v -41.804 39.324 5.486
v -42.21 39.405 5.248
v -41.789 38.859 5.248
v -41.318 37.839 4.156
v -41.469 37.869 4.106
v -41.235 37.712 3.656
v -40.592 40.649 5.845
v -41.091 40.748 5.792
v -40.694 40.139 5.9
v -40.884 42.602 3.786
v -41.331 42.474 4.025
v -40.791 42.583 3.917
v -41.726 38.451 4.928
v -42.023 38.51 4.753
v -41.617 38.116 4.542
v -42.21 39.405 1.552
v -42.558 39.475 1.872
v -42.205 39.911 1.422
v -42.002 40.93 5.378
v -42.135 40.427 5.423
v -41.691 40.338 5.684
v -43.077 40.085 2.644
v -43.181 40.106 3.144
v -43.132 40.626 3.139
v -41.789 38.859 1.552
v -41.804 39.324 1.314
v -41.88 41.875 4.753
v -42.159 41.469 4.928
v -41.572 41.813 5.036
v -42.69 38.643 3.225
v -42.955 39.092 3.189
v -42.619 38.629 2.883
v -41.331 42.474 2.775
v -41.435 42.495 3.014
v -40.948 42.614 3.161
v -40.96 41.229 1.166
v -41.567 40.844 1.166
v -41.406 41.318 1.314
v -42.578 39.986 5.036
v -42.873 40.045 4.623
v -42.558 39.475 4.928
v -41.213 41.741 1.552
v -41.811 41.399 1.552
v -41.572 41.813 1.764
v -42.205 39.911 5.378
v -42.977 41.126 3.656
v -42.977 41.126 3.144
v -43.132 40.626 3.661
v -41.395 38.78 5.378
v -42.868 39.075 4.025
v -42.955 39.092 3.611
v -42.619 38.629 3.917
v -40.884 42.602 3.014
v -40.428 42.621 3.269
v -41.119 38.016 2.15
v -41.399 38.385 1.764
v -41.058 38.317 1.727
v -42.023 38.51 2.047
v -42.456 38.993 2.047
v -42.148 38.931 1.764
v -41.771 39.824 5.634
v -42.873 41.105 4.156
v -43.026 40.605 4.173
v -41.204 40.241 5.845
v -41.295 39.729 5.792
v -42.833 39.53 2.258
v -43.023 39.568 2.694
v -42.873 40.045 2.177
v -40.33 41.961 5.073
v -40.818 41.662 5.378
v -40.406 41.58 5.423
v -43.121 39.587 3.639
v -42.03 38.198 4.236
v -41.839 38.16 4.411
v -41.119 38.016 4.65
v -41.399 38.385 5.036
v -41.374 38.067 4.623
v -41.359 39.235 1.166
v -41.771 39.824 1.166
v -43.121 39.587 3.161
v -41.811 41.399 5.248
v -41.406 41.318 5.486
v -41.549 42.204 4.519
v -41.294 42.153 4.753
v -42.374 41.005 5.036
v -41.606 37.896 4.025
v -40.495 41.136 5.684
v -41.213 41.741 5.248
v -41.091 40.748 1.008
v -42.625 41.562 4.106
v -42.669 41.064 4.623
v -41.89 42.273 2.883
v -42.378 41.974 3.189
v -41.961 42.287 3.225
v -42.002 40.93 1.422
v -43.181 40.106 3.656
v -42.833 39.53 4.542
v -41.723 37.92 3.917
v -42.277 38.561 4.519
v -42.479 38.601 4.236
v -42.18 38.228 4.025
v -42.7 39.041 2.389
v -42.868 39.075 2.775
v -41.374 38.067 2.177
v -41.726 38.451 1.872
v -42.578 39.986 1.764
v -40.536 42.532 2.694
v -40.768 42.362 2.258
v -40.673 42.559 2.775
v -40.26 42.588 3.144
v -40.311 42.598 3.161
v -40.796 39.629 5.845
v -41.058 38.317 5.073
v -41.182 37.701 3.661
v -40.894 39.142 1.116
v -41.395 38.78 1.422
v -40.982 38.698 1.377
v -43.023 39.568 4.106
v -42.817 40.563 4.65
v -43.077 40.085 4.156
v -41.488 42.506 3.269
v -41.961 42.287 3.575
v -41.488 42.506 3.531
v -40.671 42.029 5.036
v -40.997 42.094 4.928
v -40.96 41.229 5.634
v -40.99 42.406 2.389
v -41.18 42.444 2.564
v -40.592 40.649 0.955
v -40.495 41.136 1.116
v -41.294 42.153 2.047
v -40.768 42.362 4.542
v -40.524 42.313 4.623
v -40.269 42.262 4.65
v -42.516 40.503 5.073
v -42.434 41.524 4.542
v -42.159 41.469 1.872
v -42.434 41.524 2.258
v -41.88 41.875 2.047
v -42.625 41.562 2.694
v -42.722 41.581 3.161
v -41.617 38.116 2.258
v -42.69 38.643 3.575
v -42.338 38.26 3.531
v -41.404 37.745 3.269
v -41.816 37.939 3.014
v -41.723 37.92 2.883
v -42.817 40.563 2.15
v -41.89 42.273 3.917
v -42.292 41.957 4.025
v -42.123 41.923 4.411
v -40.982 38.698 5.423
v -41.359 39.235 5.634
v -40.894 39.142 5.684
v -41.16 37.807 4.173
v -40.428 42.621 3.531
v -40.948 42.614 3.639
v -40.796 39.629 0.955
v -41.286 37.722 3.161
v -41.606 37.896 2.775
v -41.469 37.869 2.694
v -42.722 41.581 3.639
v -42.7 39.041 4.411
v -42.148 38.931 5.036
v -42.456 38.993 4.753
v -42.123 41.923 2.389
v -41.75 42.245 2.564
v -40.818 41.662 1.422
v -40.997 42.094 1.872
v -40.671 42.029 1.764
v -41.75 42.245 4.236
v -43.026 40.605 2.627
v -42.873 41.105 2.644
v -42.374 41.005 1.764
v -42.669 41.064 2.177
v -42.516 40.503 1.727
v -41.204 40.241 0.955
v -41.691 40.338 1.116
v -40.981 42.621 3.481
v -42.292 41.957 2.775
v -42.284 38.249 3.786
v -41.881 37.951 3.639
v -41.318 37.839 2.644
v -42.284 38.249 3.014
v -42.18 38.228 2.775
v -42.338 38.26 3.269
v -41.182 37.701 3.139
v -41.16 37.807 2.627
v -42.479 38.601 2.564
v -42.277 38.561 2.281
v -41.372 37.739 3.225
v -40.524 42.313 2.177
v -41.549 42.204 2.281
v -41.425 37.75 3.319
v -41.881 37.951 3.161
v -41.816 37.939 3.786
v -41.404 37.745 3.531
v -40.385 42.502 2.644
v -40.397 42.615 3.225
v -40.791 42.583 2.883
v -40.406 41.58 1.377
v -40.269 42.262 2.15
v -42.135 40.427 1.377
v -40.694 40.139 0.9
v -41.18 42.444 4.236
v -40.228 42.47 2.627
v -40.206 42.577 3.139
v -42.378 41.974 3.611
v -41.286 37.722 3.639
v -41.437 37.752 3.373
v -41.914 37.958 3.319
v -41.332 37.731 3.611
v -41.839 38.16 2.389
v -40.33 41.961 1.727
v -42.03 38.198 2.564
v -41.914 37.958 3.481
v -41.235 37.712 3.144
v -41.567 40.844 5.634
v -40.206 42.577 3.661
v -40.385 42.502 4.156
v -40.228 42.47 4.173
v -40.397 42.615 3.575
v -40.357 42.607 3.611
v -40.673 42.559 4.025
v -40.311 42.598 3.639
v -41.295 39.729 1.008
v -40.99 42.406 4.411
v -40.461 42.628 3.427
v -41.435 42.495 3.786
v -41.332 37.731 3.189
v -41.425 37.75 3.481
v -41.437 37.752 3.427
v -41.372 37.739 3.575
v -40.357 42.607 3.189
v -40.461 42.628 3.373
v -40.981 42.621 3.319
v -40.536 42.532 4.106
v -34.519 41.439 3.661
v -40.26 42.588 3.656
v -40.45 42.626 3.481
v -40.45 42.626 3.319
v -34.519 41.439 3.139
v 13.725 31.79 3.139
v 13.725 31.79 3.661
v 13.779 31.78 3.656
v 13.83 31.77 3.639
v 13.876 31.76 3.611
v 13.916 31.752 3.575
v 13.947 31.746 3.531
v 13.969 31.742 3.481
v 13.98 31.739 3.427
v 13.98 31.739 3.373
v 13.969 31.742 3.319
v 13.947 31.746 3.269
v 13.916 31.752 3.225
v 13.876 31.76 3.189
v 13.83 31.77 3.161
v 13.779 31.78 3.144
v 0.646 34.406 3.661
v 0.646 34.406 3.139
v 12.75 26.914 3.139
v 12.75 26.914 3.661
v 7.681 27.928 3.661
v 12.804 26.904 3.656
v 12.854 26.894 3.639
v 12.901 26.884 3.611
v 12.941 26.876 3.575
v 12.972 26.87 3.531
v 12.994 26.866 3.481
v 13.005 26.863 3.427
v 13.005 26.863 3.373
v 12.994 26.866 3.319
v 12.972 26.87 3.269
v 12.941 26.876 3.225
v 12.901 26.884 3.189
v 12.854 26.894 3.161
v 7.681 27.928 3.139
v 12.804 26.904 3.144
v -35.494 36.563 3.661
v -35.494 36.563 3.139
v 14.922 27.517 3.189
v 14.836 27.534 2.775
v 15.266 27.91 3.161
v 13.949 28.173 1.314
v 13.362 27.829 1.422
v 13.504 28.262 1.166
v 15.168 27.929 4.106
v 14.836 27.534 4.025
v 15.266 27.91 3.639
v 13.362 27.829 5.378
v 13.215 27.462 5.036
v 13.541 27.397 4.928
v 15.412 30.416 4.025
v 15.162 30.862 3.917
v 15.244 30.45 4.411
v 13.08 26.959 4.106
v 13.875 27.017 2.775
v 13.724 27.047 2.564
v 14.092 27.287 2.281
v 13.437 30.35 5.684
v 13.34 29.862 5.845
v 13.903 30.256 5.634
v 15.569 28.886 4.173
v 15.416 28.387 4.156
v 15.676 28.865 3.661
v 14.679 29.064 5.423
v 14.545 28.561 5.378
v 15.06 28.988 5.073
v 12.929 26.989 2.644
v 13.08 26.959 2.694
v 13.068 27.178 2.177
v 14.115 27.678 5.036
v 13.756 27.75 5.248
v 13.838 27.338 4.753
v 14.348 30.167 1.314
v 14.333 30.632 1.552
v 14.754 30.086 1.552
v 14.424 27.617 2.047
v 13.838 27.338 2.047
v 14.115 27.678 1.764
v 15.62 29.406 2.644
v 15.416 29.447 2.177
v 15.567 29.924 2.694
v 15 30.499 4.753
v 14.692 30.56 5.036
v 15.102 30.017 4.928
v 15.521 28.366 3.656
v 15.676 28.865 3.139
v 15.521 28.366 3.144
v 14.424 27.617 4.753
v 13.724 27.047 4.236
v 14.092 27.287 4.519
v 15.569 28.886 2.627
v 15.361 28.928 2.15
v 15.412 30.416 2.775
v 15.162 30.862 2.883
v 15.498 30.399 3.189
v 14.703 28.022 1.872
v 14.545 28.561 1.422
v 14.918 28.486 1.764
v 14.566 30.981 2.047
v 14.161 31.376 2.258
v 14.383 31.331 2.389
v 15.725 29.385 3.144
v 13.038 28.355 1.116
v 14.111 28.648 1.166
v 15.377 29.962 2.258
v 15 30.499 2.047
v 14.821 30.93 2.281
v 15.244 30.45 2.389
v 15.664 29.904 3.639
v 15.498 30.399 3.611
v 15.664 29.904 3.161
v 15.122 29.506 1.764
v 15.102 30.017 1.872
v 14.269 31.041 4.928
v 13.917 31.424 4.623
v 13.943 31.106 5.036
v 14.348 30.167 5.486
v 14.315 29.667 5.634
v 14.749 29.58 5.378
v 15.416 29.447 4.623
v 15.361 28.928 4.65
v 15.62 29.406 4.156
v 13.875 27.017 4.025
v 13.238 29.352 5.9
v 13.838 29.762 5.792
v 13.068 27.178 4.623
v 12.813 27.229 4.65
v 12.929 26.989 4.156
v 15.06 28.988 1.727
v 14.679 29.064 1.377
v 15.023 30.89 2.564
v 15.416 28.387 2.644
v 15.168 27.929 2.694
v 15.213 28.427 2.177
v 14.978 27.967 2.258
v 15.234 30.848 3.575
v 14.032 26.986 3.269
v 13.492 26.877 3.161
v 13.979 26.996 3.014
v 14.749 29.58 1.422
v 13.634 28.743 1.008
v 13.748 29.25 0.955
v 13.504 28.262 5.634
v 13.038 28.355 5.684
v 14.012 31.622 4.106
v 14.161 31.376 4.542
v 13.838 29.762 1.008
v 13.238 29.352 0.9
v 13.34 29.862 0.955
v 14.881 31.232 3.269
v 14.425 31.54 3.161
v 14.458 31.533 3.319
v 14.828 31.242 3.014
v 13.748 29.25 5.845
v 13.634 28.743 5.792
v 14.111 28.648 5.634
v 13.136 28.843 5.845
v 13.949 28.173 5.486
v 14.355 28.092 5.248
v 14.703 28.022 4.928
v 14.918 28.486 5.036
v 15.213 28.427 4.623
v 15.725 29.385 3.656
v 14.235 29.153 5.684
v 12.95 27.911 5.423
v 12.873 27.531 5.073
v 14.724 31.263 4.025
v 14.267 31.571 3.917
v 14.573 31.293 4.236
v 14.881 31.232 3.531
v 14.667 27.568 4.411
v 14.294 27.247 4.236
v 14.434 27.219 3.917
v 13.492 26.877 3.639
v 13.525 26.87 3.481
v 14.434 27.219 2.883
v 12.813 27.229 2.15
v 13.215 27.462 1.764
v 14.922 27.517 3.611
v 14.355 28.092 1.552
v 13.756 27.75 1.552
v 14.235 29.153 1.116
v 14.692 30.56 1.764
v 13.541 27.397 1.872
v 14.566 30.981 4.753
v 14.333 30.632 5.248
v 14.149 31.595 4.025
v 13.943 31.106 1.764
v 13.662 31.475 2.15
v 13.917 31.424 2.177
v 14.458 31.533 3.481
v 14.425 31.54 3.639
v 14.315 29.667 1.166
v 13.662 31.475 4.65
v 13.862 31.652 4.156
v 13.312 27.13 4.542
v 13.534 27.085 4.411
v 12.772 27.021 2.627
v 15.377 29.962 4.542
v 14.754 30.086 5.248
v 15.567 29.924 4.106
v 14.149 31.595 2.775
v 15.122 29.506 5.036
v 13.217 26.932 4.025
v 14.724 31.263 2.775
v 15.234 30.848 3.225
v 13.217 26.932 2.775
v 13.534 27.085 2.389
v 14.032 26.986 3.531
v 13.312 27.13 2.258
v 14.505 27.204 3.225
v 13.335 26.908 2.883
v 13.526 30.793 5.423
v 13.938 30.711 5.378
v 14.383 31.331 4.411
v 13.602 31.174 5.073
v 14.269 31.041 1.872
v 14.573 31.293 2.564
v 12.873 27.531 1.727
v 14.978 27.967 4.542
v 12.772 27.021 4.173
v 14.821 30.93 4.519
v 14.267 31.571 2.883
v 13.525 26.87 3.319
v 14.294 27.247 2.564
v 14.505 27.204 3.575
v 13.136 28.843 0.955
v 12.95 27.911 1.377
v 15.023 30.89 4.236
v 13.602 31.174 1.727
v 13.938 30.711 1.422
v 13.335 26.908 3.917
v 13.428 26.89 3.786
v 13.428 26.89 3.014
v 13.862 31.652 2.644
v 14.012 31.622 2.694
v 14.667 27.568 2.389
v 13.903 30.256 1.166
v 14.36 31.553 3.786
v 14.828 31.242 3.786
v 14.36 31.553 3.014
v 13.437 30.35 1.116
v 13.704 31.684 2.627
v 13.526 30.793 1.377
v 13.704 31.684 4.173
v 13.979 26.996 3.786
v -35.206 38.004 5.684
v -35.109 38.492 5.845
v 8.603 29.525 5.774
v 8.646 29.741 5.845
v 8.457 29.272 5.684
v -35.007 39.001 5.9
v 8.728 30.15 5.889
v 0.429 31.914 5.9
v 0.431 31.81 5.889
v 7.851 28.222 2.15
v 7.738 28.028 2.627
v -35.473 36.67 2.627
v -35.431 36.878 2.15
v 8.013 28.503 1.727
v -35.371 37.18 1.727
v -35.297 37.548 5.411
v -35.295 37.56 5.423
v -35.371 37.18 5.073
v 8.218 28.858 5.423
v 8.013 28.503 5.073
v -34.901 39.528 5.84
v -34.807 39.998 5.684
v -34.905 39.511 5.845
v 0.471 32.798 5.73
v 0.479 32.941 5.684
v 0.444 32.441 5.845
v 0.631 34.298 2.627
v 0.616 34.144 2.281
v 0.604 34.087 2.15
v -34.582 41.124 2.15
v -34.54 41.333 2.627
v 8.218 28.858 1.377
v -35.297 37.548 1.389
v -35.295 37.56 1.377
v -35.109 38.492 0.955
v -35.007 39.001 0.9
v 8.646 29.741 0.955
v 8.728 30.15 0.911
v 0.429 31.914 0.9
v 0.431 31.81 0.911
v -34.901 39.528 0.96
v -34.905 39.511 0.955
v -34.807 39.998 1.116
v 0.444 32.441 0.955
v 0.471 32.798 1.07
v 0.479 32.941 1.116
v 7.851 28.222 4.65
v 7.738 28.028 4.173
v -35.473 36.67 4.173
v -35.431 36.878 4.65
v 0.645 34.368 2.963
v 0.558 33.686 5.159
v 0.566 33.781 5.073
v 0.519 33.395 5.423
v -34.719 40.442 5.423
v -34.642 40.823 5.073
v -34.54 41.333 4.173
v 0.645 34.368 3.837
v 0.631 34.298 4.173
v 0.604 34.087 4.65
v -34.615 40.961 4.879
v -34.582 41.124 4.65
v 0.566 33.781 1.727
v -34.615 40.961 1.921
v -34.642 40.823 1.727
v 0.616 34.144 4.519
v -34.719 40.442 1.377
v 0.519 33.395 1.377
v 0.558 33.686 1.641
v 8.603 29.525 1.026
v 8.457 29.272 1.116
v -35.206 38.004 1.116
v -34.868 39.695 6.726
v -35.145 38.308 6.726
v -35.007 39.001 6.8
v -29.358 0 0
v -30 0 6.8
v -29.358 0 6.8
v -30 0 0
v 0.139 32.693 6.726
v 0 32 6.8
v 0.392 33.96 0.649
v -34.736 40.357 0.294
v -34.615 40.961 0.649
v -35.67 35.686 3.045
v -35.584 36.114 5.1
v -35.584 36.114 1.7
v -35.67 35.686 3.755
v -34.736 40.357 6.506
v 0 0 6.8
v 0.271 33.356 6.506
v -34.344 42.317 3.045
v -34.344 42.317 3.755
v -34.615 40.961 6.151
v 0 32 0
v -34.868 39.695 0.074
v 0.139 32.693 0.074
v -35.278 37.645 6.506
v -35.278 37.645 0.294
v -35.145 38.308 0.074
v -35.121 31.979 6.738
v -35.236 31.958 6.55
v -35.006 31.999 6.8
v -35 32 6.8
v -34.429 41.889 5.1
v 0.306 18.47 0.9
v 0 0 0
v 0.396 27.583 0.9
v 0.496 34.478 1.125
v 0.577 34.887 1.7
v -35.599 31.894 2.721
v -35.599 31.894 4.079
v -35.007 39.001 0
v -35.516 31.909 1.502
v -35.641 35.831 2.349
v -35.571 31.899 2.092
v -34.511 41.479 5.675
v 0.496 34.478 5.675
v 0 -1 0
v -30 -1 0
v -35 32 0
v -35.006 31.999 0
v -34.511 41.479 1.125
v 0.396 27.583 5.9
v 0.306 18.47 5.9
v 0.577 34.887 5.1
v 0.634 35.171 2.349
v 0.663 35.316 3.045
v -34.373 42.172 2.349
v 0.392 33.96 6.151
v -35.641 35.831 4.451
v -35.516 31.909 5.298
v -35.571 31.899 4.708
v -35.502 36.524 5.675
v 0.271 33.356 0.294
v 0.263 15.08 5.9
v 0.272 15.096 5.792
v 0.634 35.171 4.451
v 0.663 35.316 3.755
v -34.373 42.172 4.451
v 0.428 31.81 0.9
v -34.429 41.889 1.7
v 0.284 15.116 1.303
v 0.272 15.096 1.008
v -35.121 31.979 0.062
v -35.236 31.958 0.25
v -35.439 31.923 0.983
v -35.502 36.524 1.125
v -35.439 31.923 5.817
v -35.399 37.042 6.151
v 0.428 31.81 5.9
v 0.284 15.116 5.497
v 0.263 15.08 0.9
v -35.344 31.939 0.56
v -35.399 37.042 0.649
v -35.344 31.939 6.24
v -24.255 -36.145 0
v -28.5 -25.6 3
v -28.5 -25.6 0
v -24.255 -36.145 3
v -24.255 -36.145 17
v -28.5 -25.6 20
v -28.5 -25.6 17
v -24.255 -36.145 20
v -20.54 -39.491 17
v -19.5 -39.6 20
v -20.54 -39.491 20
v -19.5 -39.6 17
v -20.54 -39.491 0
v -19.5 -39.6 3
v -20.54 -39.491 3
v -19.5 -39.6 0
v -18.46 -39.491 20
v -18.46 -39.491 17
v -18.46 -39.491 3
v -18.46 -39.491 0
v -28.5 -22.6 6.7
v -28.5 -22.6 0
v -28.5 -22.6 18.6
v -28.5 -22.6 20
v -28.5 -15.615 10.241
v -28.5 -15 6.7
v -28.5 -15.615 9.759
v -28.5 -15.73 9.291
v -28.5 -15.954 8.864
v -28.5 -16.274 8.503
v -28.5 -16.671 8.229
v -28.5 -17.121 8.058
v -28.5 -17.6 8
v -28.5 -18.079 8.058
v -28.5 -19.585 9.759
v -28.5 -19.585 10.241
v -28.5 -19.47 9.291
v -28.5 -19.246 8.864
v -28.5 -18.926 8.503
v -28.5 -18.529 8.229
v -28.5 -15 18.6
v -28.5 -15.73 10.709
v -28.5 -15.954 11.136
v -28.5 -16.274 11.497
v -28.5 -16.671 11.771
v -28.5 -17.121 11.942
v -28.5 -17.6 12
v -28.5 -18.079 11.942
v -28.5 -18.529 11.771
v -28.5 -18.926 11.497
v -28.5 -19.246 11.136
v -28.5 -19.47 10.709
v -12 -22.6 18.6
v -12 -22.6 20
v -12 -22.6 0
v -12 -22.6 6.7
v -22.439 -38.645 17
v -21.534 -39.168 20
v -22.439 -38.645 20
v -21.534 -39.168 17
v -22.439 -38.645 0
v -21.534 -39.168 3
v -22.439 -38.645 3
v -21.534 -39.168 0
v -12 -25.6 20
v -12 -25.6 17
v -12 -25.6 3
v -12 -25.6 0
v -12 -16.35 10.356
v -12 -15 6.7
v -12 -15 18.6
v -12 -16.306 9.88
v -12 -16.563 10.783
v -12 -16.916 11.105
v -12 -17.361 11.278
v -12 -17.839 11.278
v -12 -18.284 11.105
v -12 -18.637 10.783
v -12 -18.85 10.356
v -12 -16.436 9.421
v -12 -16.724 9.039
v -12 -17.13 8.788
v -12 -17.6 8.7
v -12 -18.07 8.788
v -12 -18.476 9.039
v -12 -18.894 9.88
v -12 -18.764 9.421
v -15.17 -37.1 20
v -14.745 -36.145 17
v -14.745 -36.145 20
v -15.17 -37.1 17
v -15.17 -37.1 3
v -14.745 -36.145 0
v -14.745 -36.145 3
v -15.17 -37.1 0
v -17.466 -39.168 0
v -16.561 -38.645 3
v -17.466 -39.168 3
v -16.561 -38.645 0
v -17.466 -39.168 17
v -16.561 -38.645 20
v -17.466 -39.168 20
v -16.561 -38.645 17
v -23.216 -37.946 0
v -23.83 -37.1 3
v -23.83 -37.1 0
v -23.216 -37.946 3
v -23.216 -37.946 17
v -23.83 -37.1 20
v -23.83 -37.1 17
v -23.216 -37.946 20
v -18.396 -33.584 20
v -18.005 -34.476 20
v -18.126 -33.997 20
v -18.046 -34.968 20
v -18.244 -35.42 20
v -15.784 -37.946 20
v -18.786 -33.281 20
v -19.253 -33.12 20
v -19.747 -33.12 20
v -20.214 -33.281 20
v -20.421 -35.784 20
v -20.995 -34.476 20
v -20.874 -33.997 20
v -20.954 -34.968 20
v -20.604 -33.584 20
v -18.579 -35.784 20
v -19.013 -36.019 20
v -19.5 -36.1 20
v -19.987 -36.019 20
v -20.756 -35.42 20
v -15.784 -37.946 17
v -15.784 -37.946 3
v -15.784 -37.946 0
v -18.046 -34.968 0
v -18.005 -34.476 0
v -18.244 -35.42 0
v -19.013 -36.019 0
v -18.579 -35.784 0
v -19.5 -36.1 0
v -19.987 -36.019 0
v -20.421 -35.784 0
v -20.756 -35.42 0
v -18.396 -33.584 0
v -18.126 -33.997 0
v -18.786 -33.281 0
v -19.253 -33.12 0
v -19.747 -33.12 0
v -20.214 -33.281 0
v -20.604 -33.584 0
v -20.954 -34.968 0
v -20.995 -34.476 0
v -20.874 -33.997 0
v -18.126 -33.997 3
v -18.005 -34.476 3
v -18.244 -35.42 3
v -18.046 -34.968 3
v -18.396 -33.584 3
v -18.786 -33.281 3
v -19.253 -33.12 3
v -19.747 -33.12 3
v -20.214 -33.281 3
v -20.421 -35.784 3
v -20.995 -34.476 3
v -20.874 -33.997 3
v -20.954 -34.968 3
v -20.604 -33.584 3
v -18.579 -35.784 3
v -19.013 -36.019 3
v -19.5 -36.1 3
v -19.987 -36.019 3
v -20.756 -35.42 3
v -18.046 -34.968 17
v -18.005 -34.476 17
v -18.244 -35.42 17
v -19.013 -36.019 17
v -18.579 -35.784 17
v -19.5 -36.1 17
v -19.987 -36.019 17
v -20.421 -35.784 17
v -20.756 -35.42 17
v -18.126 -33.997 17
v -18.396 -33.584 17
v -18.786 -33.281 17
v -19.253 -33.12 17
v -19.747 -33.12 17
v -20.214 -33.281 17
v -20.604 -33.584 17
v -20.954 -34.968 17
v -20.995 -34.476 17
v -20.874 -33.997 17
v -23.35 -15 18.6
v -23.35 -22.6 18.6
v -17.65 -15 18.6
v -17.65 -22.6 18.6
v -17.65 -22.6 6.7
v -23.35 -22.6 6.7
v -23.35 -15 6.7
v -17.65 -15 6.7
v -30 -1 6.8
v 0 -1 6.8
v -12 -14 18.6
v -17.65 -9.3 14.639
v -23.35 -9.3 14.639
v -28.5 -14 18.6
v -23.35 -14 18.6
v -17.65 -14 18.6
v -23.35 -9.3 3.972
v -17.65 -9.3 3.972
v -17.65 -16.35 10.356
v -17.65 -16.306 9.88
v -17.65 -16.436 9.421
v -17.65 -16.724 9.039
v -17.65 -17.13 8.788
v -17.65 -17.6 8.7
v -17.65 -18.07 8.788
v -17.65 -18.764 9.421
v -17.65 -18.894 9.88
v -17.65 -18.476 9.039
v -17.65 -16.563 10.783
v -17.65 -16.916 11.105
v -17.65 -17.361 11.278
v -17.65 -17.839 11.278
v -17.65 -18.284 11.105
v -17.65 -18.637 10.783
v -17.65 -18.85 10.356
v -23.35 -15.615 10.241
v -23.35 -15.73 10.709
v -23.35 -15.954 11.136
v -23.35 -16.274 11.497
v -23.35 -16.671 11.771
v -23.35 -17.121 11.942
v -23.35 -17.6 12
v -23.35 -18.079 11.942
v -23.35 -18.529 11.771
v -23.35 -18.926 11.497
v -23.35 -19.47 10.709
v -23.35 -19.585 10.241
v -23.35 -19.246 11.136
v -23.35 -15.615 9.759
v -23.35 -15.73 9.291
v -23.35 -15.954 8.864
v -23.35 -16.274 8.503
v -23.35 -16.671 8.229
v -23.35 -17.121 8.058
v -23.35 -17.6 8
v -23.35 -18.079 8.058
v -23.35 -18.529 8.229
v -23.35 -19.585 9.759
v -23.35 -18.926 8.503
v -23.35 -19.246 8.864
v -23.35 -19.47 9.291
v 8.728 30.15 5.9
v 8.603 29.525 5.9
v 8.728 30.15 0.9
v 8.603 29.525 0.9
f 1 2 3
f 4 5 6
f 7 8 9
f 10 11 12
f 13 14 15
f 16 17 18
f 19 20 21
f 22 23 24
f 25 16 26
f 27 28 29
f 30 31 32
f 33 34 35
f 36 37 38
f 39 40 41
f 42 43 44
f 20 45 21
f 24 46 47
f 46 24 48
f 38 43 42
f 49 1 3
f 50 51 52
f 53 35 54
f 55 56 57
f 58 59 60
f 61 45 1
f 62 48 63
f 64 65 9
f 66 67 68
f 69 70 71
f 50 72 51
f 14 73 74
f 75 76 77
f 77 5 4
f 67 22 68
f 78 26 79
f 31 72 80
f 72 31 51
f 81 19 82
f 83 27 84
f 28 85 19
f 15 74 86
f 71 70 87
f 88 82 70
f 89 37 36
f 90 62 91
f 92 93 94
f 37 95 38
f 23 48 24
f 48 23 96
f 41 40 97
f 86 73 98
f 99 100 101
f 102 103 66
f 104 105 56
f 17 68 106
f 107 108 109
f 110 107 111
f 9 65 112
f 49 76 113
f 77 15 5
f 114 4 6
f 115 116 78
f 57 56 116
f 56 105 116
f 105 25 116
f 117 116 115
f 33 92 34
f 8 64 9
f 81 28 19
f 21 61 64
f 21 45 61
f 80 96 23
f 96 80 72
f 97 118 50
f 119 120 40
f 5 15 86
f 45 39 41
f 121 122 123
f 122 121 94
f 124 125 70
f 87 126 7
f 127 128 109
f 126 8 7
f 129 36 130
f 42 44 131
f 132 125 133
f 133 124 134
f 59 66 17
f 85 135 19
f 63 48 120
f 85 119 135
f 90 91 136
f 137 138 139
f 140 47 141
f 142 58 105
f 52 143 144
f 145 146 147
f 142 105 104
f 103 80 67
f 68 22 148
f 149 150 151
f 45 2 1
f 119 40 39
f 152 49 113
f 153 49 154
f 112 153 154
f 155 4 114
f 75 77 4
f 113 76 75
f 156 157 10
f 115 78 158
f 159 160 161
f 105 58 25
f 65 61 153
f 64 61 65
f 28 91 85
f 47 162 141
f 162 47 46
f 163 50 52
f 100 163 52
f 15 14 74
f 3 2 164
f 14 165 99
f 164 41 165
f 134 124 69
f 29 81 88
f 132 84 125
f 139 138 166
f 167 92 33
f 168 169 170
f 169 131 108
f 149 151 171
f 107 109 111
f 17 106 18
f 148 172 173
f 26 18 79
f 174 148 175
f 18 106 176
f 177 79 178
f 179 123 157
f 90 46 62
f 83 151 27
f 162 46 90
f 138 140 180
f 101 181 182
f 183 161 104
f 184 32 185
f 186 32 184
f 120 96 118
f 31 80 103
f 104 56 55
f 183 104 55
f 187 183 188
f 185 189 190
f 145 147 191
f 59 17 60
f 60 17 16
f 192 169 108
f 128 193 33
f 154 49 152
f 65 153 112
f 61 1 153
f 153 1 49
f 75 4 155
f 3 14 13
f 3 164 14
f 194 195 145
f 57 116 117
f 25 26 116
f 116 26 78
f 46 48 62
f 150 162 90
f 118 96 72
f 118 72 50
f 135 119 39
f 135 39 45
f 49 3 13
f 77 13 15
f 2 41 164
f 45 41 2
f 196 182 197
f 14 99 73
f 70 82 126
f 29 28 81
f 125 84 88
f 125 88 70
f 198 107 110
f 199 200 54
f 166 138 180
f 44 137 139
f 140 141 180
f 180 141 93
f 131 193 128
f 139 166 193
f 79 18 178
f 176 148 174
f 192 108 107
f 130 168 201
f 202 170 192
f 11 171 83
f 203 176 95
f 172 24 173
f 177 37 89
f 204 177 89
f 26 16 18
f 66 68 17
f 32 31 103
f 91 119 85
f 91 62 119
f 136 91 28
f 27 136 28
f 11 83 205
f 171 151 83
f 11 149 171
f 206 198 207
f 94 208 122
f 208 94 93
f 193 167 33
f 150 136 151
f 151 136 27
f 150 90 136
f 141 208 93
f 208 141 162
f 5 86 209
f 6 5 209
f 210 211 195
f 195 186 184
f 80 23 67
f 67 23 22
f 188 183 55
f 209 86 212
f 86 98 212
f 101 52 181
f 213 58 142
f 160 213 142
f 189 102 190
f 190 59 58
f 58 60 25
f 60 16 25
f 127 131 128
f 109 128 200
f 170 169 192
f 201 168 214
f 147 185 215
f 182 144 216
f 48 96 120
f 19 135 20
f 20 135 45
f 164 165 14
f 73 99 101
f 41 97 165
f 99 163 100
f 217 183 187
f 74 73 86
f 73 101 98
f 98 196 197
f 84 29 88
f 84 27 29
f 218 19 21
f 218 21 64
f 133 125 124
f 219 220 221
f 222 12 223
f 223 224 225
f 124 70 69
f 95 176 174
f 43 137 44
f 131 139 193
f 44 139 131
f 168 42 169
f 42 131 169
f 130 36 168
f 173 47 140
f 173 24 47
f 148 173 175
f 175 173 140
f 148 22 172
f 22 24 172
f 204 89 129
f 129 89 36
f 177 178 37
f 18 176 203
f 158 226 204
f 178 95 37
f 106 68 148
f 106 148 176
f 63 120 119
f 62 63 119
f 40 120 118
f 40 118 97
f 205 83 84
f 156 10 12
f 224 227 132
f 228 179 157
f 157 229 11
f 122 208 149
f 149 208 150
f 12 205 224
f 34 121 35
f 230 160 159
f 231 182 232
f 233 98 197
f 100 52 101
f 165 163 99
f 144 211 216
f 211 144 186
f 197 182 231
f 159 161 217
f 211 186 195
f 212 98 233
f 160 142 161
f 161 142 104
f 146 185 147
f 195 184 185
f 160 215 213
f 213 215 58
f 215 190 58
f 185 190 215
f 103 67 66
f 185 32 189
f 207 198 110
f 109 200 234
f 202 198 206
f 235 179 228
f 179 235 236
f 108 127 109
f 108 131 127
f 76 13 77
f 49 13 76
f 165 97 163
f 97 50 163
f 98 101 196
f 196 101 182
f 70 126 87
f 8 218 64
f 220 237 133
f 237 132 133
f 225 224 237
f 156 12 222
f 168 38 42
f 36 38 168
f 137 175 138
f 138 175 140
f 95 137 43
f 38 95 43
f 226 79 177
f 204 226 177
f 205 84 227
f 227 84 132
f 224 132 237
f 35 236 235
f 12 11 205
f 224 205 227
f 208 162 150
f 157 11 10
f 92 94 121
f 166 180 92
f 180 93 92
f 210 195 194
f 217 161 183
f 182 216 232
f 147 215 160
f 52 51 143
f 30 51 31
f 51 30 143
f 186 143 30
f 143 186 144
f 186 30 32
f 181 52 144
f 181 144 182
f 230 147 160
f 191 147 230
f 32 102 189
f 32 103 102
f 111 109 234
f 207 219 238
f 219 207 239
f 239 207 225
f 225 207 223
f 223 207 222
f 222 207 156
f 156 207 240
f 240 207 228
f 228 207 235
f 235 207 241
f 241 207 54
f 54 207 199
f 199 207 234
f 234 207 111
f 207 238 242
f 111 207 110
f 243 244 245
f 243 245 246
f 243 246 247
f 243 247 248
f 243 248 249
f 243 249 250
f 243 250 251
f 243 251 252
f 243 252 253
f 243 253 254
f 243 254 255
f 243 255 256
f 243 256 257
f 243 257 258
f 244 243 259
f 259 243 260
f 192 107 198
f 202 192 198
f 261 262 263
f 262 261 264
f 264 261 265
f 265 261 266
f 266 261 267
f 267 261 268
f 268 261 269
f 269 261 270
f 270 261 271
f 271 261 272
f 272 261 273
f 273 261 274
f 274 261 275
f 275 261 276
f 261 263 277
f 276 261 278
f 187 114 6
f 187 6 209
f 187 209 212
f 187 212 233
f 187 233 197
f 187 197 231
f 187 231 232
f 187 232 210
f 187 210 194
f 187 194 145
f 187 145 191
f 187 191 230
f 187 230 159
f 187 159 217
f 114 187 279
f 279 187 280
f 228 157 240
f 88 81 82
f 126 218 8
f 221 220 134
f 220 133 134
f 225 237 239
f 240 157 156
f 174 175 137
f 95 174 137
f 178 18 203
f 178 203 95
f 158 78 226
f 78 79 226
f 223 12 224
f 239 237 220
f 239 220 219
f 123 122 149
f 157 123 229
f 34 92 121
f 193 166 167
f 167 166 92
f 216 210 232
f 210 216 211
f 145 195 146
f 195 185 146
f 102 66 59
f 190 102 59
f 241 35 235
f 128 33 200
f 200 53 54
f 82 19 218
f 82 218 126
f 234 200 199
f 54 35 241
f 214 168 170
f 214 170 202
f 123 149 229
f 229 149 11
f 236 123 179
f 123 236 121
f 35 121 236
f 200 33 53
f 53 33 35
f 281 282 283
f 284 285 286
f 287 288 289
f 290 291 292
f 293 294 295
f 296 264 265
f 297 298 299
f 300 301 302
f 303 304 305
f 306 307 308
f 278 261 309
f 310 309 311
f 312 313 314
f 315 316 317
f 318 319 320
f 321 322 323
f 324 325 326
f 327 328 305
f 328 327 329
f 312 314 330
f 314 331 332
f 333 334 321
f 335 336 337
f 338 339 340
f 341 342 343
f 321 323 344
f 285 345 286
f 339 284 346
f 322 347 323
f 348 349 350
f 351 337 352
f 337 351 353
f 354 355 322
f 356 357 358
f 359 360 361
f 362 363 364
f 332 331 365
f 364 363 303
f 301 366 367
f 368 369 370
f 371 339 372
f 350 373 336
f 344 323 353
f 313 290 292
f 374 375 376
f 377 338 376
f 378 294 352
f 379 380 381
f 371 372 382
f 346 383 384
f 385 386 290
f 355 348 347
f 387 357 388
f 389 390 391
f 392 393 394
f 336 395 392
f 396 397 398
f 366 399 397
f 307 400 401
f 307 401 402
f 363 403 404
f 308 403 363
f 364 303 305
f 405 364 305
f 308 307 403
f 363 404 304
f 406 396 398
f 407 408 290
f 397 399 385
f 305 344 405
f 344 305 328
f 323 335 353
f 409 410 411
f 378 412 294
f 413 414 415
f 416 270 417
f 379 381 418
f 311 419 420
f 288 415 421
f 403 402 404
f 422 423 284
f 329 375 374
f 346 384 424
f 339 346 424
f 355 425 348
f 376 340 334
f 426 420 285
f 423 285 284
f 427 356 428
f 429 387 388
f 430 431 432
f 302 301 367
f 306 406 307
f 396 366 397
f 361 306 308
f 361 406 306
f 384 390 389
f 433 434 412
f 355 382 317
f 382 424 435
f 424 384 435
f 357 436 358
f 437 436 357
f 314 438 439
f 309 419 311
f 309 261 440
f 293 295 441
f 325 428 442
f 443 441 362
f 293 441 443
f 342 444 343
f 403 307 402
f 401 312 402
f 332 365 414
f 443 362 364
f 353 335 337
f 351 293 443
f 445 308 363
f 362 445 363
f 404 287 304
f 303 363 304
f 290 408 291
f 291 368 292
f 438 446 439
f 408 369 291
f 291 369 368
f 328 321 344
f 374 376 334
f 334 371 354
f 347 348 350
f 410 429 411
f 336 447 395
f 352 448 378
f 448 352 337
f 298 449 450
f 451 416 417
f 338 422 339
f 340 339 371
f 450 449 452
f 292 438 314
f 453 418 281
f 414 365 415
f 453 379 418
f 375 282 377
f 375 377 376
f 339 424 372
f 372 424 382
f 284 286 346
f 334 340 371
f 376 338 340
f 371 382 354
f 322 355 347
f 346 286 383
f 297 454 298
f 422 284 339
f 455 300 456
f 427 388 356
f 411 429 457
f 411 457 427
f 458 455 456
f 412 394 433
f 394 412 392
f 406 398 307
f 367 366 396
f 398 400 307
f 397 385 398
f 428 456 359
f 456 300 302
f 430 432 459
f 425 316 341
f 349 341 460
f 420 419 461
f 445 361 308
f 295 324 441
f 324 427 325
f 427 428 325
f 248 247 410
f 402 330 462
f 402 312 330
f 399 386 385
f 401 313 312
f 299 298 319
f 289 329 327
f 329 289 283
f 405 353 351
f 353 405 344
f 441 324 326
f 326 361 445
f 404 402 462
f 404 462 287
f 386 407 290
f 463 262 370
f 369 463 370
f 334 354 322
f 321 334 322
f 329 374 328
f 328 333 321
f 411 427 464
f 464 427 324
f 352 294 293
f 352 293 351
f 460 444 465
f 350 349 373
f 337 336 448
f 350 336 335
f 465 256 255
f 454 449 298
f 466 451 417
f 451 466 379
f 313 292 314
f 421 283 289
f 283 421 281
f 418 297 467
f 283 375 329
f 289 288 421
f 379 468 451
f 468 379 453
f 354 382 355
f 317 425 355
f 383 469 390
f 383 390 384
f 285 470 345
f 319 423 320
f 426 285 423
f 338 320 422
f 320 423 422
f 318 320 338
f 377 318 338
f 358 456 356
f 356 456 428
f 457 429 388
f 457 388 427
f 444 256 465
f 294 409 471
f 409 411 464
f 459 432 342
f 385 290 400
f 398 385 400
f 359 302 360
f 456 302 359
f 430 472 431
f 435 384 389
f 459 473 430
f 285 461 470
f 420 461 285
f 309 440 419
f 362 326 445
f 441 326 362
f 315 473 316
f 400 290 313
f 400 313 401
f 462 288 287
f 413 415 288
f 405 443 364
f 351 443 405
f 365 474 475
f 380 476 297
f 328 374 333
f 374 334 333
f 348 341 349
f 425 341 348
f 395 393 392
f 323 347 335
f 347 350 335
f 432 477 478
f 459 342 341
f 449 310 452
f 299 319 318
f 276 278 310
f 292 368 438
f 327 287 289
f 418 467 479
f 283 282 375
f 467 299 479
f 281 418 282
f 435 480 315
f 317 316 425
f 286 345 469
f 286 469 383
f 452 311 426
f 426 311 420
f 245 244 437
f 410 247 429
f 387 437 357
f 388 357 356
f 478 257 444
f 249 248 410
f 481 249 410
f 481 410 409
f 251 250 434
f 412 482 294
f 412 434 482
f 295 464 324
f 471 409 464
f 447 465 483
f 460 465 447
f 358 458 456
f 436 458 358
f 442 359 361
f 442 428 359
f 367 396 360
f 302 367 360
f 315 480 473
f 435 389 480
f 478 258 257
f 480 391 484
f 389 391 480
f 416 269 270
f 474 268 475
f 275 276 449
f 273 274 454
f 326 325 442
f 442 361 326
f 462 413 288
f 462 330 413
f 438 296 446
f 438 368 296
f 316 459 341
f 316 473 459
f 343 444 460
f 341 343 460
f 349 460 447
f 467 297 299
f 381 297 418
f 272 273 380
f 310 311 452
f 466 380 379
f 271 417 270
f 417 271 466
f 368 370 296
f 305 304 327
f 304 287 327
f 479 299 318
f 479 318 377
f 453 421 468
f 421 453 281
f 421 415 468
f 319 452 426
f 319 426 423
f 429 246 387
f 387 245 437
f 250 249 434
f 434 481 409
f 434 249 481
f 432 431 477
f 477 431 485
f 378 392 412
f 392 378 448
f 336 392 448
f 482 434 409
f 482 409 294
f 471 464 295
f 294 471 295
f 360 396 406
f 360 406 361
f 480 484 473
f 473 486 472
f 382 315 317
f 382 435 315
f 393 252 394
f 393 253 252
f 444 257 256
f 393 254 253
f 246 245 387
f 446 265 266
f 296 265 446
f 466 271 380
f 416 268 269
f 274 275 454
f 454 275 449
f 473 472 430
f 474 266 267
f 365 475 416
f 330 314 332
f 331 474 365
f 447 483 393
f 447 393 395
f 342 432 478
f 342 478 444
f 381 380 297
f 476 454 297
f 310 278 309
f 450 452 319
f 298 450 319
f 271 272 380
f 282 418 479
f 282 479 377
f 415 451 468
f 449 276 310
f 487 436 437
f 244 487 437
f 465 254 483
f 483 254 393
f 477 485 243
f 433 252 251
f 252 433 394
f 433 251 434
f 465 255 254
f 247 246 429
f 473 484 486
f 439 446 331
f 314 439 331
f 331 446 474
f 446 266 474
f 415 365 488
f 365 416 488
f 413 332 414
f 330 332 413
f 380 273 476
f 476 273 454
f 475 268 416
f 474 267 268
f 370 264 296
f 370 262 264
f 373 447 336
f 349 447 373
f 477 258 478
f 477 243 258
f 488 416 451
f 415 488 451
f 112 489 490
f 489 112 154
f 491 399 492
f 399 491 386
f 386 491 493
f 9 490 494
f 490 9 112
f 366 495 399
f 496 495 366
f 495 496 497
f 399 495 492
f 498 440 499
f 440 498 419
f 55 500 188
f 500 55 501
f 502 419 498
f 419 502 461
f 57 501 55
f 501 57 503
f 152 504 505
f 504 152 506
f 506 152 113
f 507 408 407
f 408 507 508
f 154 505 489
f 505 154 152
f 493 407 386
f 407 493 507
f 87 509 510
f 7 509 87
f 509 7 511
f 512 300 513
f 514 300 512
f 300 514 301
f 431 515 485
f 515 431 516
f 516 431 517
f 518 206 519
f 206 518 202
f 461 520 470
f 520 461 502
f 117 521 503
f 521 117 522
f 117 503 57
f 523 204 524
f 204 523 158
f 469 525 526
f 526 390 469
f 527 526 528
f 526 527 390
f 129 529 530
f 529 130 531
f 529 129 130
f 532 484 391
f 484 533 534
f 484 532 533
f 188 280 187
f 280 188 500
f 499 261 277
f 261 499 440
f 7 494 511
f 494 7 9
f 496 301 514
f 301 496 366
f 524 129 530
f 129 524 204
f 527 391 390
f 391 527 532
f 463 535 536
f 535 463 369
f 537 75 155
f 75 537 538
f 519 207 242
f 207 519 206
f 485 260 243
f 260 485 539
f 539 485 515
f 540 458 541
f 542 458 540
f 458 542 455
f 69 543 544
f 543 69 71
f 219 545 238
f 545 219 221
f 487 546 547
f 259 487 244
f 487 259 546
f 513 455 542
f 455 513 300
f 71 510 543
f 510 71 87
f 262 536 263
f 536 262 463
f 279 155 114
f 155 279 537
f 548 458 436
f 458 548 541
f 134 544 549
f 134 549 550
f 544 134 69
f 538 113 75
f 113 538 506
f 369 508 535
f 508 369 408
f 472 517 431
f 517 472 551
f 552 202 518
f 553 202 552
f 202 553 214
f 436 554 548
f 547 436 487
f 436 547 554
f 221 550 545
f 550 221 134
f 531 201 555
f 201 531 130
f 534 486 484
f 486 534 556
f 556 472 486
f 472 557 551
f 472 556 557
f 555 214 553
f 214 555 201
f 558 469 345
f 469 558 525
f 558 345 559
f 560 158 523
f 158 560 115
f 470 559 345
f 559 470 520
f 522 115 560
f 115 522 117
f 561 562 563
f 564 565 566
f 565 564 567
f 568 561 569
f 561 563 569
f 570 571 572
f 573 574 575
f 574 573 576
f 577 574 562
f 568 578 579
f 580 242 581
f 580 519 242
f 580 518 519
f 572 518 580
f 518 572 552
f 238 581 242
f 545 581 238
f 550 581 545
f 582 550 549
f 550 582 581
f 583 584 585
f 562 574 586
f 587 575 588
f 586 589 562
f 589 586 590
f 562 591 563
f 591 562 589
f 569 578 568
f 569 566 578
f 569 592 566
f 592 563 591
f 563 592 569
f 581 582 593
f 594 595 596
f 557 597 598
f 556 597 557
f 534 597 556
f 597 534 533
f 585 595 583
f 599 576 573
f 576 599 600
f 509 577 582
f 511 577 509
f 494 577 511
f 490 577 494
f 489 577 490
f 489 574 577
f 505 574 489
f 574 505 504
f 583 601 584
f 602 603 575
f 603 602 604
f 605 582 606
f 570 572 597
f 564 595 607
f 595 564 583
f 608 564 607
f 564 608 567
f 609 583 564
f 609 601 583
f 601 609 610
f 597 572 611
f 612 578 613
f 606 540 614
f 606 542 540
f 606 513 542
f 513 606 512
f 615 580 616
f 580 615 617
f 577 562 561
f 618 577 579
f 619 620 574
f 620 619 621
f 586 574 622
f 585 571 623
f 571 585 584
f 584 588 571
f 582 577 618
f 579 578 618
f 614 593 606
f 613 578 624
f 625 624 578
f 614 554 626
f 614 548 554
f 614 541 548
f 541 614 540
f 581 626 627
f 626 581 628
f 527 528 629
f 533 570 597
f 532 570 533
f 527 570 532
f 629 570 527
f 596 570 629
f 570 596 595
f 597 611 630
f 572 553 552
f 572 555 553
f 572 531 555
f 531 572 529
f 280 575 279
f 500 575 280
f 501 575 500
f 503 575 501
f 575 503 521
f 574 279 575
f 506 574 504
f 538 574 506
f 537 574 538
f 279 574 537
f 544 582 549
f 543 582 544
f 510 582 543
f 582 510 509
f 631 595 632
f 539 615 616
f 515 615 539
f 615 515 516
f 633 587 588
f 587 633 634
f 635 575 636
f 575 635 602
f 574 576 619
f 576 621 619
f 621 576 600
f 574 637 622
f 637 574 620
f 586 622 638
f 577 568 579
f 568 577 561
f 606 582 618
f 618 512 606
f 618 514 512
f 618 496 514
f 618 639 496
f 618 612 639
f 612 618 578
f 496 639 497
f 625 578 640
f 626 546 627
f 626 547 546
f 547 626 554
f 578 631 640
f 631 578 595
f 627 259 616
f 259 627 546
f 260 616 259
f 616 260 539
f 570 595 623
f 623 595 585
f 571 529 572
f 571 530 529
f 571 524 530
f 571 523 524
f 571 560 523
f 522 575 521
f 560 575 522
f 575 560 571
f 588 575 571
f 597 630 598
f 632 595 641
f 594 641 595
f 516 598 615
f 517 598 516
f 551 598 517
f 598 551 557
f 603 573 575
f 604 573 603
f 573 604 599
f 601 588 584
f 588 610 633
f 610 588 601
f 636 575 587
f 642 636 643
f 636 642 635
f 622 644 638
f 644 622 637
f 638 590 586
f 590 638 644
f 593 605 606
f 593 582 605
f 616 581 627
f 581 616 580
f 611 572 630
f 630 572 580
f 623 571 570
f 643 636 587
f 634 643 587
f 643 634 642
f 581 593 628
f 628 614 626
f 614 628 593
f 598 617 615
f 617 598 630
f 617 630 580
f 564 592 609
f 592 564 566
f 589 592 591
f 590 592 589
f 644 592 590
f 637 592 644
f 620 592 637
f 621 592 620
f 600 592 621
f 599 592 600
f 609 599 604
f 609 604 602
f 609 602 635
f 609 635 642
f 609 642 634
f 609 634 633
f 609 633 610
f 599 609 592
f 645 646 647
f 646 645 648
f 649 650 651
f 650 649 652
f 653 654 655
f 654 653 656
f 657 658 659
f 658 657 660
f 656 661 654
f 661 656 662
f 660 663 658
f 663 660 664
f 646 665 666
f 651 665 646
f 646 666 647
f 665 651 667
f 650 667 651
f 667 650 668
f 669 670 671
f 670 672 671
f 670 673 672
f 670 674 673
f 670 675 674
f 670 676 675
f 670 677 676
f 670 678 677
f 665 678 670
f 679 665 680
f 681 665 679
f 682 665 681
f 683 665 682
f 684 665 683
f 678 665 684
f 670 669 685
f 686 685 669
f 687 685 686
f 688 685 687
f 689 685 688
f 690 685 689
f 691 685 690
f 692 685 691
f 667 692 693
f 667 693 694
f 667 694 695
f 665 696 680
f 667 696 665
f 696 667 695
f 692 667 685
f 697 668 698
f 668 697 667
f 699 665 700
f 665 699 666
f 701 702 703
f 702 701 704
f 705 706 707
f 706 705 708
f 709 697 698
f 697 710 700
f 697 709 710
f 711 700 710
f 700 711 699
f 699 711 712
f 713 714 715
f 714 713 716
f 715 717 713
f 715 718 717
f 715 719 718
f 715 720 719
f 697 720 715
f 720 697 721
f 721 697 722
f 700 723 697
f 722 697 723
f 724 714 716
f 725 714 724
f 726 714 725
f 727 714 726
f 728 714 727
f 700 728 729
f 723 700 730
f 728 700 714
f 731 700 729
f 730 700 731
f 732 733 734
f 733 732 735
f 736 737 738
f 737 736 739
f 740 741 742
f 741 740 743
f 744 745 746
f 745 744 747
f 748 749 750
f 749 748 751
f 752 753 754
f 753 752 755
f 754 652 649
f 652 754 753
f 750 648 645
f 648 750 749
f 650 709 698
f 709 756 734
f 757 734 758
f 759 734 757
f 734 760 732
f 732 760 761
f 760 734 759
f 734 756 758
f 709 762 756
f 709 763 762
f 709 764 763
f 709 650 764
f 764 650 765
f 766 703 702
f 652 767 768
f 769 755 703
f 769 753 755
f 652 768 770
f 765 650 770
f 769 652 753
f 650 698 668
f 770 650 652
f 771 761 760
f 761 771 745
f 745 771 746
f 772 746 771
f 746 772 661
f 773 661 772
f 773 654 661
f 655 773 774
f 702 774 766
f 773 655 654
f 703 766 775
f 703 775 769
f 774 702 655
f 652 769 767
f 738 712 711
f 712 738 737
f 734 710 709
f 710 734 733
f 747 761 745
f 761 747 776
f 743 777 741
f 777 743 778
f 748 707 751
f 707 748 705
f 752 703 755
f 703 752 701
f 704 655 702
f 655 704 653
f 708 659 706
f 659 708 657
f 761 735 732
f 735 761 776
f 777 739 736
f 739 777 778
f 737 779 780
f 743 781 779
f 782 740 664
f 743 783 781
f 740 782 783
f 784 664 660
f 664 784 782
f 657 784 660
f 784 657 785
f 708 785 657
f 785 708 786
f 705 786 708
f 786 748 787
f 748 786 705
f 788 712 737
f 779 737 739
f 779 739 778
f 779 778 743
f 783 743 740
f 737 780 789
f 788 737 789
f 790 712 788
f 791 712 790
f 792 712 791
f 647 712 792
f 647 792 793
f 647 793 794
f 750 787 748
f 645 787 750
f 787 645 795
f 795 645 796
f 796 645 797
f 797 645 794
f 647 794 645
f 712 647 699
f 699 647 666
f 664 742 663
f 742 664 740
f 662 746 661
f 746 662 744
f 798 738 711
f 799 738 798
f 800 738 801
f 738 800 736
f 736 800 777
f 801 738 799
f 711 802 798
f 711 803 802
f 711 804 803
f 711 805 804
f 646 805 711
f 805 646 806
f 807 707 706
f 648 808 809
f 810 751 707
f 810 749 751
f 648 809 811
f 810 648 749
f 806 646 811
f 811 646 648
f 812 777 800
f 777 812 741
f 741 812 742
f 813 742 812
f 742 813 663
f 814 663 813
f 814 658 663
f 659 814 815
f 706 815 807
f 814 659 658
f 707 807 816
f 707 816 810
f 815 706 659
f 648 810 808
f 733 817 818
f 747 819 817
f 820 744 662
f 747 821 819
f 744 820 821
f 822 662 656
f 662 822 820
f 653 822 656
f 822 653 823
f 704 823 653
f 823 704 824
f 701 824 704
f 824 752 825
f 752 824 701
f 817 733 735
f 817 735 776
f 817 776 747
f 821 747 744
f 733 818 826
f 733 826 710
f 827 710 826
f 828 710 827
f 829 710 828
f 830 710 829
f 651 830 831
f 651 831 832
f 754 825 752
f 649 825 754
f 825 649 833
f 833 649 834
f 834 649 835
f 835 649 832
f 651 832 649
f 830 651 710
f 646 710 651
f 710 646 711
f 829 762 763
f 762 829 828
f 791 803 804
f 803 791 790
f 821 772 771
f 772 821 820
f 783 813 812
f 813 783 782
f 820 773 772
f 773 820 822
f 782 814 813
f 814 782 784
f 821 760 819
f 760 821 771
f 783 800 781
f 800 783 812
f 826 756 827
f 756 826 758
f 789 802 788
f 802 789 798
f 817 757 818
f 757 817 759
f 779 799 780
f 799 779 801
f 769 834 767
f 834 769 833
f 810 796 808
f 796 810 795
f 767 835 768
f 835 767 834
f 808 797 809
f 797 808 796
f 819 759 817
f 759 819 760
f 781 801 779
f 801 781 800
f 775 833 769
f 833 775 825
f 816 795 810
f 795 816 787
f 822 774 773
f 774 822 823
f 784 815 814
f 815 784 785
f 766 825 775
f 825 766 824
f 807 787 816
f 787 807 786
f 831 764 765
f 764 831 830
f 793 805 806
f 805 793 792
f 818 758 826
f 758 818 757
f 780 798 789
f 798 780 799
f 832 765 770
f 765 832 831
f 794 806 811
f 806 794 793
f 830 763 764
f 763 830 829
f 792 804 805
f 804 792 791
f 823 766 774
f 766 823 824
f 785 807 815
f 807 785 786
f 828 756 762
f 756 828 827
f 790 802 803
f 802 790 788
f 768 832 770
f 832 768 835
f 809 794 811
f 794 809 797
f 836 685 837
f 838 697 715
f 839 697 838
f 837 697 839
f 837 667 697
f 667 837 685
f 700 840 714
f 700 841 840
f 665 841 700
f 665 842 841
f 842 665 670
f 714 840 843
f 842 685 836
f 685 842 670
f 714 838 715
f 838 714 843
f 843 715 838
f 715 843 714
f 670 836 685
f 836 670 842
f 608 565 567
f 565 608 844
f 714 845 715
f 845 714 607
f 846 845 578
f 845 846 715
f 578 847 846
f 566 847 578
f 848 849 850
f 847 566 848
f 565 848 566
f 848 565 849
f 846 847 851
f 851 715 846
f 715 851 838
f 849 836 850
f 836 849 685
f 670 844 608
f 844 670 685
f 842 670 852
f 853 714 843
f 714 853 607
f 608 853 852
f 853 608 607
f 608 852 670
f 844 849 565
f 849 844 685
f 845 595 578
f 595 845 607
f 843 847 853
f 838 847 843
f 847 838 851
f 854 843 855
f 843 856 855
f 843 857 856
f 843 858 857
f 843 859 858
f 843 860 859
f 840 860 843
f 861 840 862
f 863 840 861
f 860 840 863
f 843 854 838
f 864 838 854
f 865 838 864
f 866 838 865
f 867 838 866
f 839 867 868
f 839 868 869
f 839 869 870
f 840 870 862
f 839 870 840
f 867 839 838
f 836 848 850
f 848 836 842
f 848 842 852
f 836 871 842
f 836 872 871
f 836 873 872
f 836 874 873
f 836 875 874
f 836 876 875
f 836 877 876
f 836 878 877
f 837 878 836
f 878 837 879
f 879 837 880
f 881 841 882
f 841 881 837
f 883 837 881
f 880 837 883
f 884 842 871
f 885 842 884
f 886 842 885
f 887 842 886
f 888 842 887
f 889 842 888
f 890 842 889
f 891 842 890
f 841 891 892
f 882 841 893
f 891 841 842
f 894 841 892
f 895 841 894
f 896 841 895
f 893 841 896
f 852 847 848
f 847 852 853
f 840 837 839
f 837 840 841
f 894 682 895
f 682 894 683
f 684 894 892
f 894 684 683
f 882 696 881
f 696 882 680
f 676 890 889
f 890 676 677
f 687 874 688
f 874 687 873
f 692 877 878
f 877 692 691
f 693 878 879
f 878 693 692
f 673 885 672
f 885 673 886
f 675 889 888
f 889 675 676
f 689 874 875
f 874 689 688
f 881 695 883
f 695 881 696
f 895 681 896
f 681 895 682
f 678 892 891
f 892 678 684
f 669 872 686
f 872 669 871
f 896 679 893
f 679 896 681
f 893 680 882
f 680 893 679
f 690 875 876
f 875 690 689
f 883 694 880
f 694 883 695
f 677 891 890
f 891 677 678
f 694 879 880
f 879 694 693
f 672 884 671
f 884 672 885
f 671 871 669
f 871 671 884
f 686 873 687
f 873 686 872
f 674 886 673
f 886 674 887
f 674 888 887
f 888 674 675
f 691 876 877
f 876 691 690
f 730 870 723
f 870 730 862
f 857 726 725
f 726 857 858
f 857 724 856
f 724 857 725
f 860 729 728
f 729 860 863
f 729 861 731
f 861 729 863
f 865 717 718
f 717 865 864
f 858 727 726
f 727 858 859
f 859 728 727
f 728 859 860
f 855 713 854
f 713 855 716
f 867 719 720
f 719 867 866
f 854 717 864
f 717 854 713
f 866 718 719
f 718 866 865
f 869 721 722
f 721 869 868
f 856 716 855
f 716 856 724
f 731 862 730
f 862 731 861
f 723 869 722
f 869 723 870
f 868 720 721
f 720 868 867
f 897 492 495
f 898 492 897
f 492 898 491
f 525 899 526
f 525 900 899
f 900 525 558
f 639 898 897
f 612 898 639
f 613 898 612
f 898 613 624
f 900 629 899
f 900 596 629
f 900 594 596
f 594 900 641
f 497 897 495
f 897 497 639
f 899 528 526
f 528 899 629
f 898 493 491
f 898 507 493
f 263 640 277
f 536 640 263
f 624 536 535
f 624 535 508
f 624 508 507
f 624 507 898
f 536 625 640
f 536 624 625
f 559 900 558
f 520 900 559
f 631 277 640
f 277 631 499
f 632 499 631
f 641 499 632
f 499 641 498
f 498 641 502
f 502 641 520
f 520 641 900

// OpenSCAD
$fs = 0.5;

printerOffset = 0.2;
diameterAxis = 5;
heightAxis = 55;

//mainbody
depthMax = 35;
widthMax = 32;
height = 7-printerOffset;
angleAxis = 11.31;
heightAxis2= 35.7;
offsetAxis = 16;
offsetGetSmaller = 27;
heightOnTheMiddlePart = 30;

//wheelholder
wheelHolderOuterDiameter = 10; 
wheelHolderInnerDiameter = 3;
innerHeight = 14;
widthDown = 3;
widthTop = 3;
adiitionalDiameterTop = 7;
aditionalHeightTop = 1;

//plateOfWheelHolder
plateWidth = 16.5;
plateHeight = innerHeight+widthDown+widthTop;
plateThickness = 3;

//placement of wheelAxis
distanceFromPlate = 9;
offsetFromPlate = 8;

//posionAxisToHolder
positionAxisToHolderOffset = 12;

axisWithBase();


module axis(){
    translate([0,heightAxis+diameterAxis/2]){
        sphere(d=diameterAxis);
        translate([0, -heightAxis,0]) sphere(d=diameterAxis);
        rotate([90,0,0])cylinder(d=diameterAxis, h=heightAxis);
    }   
}



module axisWithBase() {
translate([-depthMax,0,0]) difference(){
    union(){
        hull(){
            cube([depthMax, widthMax, height]);
            translate([depthMax,widthMax,height/2]){
                rotate([0,-90,-angleAxis]){
                    cylinder(d=height, h=heightAxis2);
                }
            }
        }
        translate([depthMax,widthMax,height/2])rotate([90,-90,-angleAxis]) translate([0,-offsetAxis,0]) axis();
    }
    translate([0,widthMax,-0.5])rotate([0,0,190])cube([10,widthMax+10,height+1]);
}
}



module wheelHolder(){
    translate([0,0,plateHeight])mirror([1,0,0])rotate([180,0,-90])difference(){
        union(){
            hull(){
                cube([plateThickness, plateWidth, plateHeight]);    
                translate([distanceFromPlate+plateThickness, distanceFromPlate, 0]) cylinder(d=wheelHolderOuterDiameter, h=plateHeight);
            }  
        //translate([distanceFromPlate+plateThickness, distanceFromPlate, 0]) cylinder(d=adiitionalDiameterTop, h= plateHeight+aditionalHeightTop);
        }
        translate([plateThickness,-1,widthDown])cube([20, plateWidth+2, plateHeight-widthTop-widthDown]);
        translate([distanceFromPlate+plateThickness, distanceFromPlate, -0.5]) cylinder(d=wheelHolderInnerDiameter, h= plateHeight+aditionalHeightTop+1); 
    }
}

lengthCubeOnWheelHolder = 7.6;
heightCubeOnWheelHolder = 11.9;
topOffsetCubeOnWheelHolder = 1.4;

//SpareCube
widthSpareCube = 5.7;
lengthSpareCube = 13.3;
positionFromOuterEnd = 5.15;

DistandeBetweenWheelHolderPlateAndMainBody = 22.6;


//wheelHolderAxisSpare
wheelHolderAxisSpareWider = 4;
wheelHolderAxisSpareSmaller = 2.6;
positionSpareAxisY = 5;
positionSpareAxisZ = 10;


//21
//9

difference(){
    union(){
hull(){
translate([-plateWidth-positionAxisToHolderOffset,-DistandeBetweenWheelHolderPlateAndMainBody,0])translate([0,lengthCubeOnWheelHolder,plateHeight-heightCubeOnWheelHolder-topOffsetCubeOnWheelHolder])cube([plateWidth,1,heightCubeOnWheelHolder]);
translate([-heightOnTheMiddlePart,-1,0])cube([heightOnTheMiddlePart,1,height]);
}
translate([-plateWidth-positionAxisToHolderOffset,-DistandeBetweenWheelHolderPlateAndMainBody,0]){
wheelHolder();
translate([0,0,plateHeight-heightCubeOnWheelHolder-topOffsetCubeOnWheelHolder])cube([plateWidth,lengthCubeOnWheelHolder,heightCubeOnWheelHolder]);
}

}
translate([-plateWidth-positionAxisToHolderOffset,-DistandeBetweenWheelHolderPlateAndMainBody,0])translate([positionFromOuterEnd,0,0])cube([widthSpareCube,lengthSpareCube,plateHeight]);

translate([-plateWidth-positionAxisToHolderOffset-1,-DistandeBetweenWheelHolderPlateAndMainBody+positionSpareAxisY,positionSpareAxisZ])rotate([0,90,0])cylinder(d= wheelHolderAxisSpareWider, h= 7);

translate([-plateWidth-positionAxisToHolderOffset-1+positionFromOuterEnd+widthSpareCube,-DistandeBetweenWheelHolderPlateAndMainBody+positionSpareAxisY,positionSpareAxisZ])rotate([0,90,0])cylinder(d= wheelHolderAxisSpareSmaller, h= 8);
}

difference(){
translate([-5,12.5,(height-diameterAxis)/2])rotate([0,0,-angleAxis])cube([10,20,diameterAxis]);
translate([-7,2.5,(height-diameterAxis)/2-1])rotate([0,0,-30])cube([10,35,diameterAxis+2]);
}
